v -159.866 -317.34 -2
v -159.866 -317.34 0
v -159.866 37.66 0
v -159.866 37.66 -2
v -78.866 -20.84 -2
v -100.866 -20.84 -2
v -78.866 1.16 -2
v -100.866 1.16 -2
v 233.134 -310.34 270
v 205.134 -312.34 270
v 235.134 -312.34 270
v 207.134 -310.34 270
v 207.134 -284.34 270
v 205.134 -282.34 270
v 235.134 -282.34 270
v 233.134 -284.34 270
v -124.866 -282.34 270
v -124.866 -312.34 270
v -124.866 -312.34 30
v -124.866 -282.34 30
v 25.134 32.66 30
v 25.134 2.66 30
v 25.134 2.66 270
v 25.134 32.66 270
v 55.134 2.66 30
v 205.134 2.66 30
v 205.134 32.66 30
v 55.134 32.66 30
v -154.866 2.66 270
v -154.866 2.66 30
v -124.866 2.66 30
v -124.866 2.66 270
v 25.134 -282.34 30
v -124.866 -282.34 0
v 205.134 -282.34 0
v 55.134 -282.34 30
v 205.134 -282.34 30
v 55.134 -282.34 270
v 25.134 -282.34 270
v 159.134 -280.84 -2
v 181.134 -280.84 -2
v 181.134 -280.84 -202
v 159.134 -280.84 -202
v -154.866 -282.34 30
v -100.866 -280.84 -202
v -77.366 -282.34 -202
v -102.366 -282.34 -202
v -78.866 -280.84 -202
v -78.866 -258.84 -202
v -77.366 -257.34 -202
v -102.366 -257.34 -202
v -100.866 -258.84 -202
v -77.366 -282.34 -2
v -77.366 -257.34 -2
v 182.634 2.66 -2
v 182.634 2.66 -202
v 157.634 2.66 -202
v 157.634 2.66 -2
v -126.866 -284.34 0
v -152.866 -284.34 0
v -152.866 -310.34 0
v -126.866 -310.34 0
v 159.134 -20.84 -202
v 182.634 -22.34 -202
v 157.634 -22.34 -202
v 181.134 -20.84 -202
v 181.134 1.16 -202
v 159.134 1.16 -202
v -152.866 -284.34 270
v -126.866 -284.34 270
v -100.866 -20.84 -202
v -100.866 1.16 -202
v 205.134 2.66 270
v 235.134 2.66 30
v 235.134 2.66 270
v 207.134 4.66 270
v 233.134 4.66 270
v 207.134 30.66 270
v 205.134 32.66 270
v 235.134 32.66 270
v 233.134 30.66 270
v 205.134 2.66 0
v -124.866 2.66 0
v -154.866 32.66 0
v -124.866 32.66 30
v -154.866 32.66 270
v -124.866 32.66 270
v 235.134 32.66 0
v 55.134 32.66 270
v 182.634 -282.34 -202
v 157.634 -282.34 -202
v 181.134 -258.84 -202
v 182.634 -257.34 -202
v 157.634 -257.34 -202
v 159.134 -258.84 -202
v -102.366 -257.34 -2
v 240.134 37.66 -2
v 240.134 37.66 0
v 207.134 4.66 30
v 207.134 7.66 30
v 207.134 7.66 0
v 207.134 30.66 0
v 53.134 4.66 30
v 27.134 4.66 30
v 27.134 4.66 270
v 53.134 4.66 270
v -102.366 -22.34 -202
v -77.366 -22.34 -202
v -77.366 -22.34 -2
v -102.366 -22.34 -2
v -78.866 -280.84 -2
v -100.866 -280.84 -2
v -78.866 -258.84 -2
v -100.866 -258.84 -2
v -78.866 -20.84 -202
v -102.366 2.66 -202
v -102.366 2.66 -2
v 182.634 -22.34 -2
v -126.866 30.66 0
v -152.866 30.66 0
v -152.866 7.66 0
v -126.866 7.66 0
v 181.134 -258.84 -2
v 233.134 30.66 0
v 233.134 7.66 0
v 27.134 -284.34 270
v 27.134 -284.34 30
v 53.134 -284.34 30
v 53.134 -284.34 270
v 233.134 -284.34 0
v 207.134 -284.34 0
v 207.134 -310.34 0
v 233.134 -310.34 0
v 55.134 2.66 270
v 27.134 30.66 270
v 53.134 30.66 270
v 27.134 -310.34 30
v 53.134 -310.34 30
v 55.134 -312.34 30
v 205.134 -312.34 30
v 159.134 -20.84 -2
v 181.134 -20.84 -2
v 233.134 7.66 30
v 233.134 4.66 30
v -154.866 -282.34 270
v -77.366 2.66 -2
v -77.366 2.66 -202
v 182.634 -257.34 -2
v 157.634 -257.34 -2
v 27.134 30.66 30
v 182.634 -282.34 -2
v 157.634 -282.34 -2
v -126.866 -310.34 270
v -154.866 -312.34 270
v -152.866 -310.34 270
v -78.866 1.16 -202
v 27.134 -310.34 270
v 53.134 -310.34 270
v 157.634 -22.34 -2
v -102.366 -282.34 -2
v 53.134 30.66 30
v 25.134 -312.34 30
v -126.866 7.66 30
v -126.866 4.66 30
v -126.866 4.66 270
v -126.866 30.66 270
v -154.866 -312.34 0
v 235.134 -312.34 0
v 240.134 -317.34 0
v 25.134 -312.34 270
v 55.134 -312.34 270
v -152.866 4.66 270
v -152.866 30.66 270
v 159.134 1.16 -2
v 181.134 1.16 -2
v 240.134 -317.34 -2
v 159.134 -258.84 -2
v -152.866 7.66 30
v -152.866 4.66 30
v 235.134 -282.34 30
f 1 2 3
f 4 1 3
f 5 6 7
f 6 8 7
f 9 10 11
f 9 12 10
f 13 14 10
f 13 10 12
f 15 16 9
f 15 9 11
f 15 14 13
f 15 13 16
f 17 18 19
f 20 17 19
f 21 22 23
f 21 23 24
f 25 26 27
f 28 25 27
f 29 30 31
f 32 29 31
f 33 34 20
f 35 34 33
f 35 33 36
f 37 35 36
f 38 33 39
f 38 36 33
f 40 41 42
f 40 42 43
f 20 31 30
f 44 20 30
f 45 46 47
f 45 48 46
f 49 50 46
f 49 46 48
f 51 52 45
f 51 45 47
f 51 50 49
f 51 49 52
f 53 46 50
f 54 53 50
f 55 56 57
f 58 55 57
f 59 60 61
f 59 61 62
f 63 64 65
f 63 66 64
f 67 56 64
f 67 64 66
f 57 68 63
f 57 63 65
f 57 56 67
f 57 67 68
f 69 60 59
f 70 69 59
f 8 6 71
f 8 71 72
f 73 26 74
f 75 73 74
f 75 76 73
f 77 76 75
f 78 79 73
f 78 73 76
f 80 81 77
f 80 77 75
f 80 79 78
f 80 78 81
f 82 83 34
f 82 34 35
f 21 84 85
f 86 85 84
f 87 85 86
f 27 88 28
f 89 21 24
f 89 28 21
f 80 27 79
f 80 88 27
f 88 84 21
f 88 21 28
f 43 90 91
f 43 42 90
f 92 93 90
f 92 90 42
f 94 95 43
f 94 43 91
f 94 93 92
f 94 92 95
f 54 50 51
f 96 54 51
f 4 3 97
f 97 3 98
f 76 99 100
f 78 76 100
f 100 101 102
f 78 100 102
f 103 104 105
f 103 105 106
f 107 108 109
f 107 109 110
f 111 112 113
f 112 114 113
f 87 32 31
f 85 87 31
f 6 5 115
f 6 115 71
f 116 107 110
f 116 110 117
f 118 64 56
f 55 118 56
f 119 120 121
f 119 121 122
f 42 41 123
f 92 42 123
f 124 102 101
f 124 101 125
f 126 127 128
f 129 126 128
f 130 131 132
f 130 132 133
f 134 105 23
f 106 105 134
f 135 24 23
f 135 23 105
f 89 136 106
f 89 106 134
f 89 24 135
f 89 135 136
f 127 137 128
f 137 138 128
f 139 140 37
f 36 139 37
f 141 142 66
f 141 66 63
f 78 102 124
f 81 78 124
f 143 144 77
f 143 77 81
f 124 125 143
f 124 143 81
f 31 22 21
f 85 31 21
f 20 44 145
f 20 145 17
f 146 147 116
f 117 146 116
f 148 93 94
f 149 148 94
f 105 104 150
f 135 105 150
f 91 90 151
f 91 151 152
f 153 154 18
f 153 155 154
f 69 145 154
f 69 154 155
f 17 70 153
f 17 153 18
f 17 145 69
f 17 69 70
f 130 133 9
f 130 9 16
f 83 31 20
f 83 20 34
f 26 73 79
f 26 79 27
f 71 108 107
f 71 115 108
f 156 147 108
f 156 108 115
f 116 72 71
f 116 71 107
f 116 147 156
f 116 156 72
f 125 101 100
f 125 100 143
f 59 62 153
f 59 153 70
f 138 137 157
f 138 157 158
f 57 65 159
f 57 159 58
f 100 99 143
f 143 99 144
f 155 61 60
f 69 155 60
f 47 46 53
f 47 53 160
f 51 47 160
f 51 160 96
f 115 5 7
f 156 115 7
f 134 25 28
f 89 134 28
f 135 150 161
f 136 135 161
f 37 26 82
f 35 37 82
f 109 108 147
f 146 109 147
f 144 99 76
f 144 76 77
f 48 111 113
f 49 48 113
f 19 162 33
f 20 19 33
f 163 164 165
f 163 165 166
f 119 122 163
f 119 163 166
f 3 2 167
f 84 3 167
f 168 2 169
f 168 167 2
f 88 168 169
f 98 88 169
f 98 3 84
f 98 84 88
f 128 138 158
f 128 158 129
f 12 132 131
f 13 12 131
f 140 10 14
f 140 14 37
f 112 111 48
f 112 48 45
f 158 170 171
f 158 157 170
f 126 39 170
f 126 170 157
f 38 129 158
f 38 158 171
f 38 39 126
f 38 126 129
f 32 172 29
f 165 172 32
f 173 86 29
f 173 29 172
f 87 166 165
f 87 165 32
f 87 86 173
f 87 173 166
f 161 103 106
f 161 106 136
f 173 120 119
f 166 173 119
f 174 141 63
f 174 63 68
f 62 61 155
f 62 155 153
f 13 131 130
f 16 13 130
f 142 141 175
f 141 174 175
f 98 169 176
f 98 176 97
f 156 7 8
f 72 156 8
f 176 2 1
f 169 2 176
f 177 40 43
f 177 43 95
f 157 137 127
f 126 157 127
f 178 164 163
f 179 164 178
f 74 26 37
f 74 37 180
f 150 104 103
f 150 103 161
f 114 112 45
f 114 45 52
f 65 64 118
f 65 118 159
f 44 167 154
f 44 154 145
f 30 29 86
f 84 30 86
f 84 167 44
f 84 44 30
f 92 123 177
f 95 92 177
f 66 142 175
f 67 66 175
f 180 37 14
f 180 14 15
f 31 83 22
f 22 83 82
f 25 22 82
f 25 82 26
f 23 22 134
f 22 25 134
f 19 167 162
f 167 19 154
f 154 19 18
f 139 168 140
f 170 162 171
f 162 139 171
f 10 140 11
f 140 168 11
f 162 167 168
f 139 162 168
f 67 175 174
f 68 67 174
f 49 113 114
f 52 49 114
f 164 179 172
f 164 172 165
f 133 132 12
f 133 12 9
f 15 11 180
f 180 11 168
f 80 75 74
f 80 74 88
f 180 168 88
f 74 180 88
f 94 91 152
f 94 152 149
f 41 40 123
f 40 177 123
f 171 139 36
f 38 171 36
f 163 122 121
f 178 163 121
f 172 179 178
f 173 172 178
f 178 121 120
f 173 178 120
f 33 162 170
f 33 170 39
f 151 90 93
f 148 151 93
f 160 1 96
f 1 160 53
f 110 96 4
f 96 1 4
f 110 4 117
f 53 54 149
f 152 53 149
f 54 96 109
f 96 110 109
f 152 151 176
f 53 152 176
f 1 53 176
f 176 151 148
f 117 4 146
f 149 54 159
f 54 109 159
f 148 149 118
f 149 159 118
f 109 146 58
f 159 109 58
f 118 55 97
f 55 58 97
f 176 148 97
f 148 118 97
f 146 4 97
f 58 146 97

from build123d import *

# Parameters (mm, degrees)
SKETCH_1_W        = 30
SKETCH_1_H        = 30
SKETCH_1_W_2      = 26
SKETCH_1_H_2      = 26
EXTRUDE_1_DEPTH   = 270
EXTRUDE_1_2_DEPTH = 270
EXTRUDE_1_3_DEPTH = 270
EXTRUDE_1_4_DEPTH = 270
EXTRUDE_1_5_DEPTH = 270
EXTRUDE_1_6_DEPTH = 270
SKETCH_1_4_W      = 400
SKETCH_1_4_H      = 355
EXTRUDE_2_DEPTH   = 2
SKETCH_3_W        = 25
SKETCH_3_H        = 25
SKETCH_3_W_2      = 22
SKETCH_3_H_2      = 22
EXTRUDE_3_DEPTH   = 200
SKETCH_9_W        = 30
SKETCH_9_H        = 30
EXTRUDE_4_DEPTH   = 290
SKETCH_10_W       = 30
SKETCH_10_H       = 30
EXTRUDE_5_DEPTH   = 330


with BuildPart() as part:
    # 草圖1 → 填料-伸長1 (new body)
    with BuildSketch(Plane.XY):
        with Locations((-139.865693992, 17.660065035)):
            Rectangle(SKETCH_1_W, SKETCH_1_H)
        with Locations((-139.865693992, 17.660065035)):
            Rectangle(SKETCH_1_W_2, SKETCH_1_H_2, mode=Mode.SUBTRACT)
    extrude(amount=EXTRUDE_1_DEPTH)



with BuildPart() as body_2:
    # 草圖1 → Extrude 1 2 (new body)
    with BuildSketch(Plane.XY):
        with Locations((40.134306008, 17.660065035)):
            Rectangle(SKETCH_1_W, SKETCH_1_H)
        with Locations((40.134306008, 17.660065035)):
            Rectangle(SKETCH_1_W_2, SKETCH_1_H_2, mode=Mode.SUBTRACT)
    extrude(amount=EXTRUDE_1_2_DEPTH)


with BuildPart() as body_3:
    # 草圖1 → Extrude 1 3 (new body)
    with BuildSketch(Plane.XY):
        with Locations((220.134306008, 17.660065035)):
            Rectangle(SKETCH_1_W, SKETCH_1_H)
        with Locations((220.134306008, 17.660065035)):
            Rectangle(SKETCH_1_W_2, SKETCH_1_H_2, mode=Mode.SUBTRACT)
    extrude(amount=EXTRUDE_1_3_DEPTH)


with BuildPart() as body_4:
    # 草圖1 → Extrude 1 4 (new body)
    with BuildSketch(Plane.XY):
        with Locations((-139.865693992, -297.339934965)):
            Rectangle(SKETCH_1_W, SKETCH_1_H)
        with Locations((-139.865693992, -297.339934965)):
            Rectangle(SKETCH_1_W_2, SKETCH_1_H_2, mode=Mode.SUBTRACT)
    extrude(amount=EXTRUDE_1_4_DEPTH)


with BuildPart() as body_5:
    # 草圖1 → Extrude 1 5 (new body)
    with BuildSketch(Plane.XY):
        with Locations((40.134306008, -297.339934965)):
            Rectangle(SKETCH_1_W, SKETCH_1_H)
        with Locations((40.134306008, -297.339934965)):
            Rectangle(SKETCH_1_W_2, SKETCH_1_H_2, mode=Mode.SUBTRACT)
    extrude(amount=EXTRUDE_1_5_DEPTH)


with BuildPart() as body_6:
    # 草圖1 → Extrude 1 6 (new body)
    with BuildSketch(Plane.XY):
        with Locations((220.134306008, -297.339934965)):
            Rectangle(SKETCH_1_W, SKETCH_1_H)
        with Locations((220.134306008, -297.339934965)):
            Rectangle(SKETCH_1_W_2, SKETCH_1_H_2, mode=Mode.SUBTRACT)
    extrude(amount=EXTRUDE_1_6_DEPTH)


with BuildPart() as part_1:
    add(part.part)

    add(body_2.part)  # 填料-伸長2 merges body 2

    add(body_3.part)  # 填料-伸長2 merges body 3

    add(body_4.part)  # 填料-伸長2 merges body 4

    add(body_5.part)  # 填料-伸長2 merges body 5

    add(body_6.part)  # 填料-伸長2 merges body 6
    # 草圖1<4> → 填料-伸長2 (add)
    with BuildSketch(Plane.XY):
        with Locations((40.134306008, -139.839934965)):
            Rectangle(SKETCH_1_4_W, SKETCH_1_4_H)
    extrude(amount=-EXTRUDE_2_DEPTH)

    # 草圖3 → 填料-伸長3 (add)
    # profile 1 of 4: a face of its own
    with BuildSketch(Plane(origin=(0, 0, -2), x_dir=(-1, 0, 0), z_dir=(0, 0, -1))):
        with Locations((-170.134306008, -9.839934965)):
            Rectangle(SKETCH_3_W, SKETCH_3_H)
        with Locations((-170.134306008, -9.839934965)):
            Rectangle(SKETCH_3_W_2, SKETCH_3_H_2, mode=Mode.SUBTRACT)
    # profile 2 of 4: a face of its own
    with BuildSketch(Plane(origin=(0, 0, -2), x_dir=(-1, 0, 0), z_dir=(0, 0, -1))):
        with Locations((-170.134306008, -269.839934965)):
            Rectangle(SKETCH_3_W, SKETCH_3_H)
        with Locations((-170.134306008, -269.839934965)):
            Rectangle(SKETCH_3_W_2, SKETCH_3_H_2, mode=Mode.SUBTRACT)
    # profile 3 of 4: a face of its own
    with BuildSketch(Plane(origin=(0, 0, -2), x_dir=(-1, 0, 0), z_dir=(0, 0, -1))):
        with Locations((89.865693992, -269.839934965)):
            Rectangle(SKETCH_3_W, SKETCH_3_H)
        with Locations((89.865693992, -269.839934965)):
            Rectangle(SKETCH_3_W_2, SKETCH_3_H_2, mode=Mode.SUBTRACT)
    # profile 4 of 4: a face of its own
    with BuildSketch(Plane(origin=(0, 0, -2), x_dir=(-1, 0, 0), z_dir=(0, 0, -1))):
        with Locations((89.865693992, -9.839934965)):
            Rectangle(SKETCH_3_W, SKETCH_3_H)
        with Locations((89.865693992, -9.839934965)):
            Rectangle(SKETCH_3_W_2, SKETCH_3_H_2, mode=Mode.SUBTRACT)
    extrude(amount=EXTRUDE_3_DEPTH)

    # 草圖9 → 填料-伸長4 (add)
    with BuildSketch(Plane(origin=(0, -282.339934965, 0), x_dir=(1, 0, 0), z_dir=(0, 1, 0))):
        with Locations((220.134306008, -15)):
            Rectangle(SKETCH_9_W, SKETCH_9_H)
    extrude_4 = extrude(amount=EXTRUDE_4_DEPTH)

    # 鏡射1: 填料-伸長4 across plane
    add(extrude_4.mirror(Plane.ZY.offset(-40.134306008)))

    # 草圖10 → 填料-伸長5 (add)
    with BuildSketch(Plane.ZY.offset(-205.134306008)):
        with Locations((15, -297.339934965)):
            Rectangle(SKETCH_10_W, SKETCH_10_H)
        with Locations((15, 17.660065035)):
            Rectangle(SKETCH_10_W, SKETCH_10_H)
    extrude(amount=EXTRUDE_5_DEPTH)


solid = part_1.part
